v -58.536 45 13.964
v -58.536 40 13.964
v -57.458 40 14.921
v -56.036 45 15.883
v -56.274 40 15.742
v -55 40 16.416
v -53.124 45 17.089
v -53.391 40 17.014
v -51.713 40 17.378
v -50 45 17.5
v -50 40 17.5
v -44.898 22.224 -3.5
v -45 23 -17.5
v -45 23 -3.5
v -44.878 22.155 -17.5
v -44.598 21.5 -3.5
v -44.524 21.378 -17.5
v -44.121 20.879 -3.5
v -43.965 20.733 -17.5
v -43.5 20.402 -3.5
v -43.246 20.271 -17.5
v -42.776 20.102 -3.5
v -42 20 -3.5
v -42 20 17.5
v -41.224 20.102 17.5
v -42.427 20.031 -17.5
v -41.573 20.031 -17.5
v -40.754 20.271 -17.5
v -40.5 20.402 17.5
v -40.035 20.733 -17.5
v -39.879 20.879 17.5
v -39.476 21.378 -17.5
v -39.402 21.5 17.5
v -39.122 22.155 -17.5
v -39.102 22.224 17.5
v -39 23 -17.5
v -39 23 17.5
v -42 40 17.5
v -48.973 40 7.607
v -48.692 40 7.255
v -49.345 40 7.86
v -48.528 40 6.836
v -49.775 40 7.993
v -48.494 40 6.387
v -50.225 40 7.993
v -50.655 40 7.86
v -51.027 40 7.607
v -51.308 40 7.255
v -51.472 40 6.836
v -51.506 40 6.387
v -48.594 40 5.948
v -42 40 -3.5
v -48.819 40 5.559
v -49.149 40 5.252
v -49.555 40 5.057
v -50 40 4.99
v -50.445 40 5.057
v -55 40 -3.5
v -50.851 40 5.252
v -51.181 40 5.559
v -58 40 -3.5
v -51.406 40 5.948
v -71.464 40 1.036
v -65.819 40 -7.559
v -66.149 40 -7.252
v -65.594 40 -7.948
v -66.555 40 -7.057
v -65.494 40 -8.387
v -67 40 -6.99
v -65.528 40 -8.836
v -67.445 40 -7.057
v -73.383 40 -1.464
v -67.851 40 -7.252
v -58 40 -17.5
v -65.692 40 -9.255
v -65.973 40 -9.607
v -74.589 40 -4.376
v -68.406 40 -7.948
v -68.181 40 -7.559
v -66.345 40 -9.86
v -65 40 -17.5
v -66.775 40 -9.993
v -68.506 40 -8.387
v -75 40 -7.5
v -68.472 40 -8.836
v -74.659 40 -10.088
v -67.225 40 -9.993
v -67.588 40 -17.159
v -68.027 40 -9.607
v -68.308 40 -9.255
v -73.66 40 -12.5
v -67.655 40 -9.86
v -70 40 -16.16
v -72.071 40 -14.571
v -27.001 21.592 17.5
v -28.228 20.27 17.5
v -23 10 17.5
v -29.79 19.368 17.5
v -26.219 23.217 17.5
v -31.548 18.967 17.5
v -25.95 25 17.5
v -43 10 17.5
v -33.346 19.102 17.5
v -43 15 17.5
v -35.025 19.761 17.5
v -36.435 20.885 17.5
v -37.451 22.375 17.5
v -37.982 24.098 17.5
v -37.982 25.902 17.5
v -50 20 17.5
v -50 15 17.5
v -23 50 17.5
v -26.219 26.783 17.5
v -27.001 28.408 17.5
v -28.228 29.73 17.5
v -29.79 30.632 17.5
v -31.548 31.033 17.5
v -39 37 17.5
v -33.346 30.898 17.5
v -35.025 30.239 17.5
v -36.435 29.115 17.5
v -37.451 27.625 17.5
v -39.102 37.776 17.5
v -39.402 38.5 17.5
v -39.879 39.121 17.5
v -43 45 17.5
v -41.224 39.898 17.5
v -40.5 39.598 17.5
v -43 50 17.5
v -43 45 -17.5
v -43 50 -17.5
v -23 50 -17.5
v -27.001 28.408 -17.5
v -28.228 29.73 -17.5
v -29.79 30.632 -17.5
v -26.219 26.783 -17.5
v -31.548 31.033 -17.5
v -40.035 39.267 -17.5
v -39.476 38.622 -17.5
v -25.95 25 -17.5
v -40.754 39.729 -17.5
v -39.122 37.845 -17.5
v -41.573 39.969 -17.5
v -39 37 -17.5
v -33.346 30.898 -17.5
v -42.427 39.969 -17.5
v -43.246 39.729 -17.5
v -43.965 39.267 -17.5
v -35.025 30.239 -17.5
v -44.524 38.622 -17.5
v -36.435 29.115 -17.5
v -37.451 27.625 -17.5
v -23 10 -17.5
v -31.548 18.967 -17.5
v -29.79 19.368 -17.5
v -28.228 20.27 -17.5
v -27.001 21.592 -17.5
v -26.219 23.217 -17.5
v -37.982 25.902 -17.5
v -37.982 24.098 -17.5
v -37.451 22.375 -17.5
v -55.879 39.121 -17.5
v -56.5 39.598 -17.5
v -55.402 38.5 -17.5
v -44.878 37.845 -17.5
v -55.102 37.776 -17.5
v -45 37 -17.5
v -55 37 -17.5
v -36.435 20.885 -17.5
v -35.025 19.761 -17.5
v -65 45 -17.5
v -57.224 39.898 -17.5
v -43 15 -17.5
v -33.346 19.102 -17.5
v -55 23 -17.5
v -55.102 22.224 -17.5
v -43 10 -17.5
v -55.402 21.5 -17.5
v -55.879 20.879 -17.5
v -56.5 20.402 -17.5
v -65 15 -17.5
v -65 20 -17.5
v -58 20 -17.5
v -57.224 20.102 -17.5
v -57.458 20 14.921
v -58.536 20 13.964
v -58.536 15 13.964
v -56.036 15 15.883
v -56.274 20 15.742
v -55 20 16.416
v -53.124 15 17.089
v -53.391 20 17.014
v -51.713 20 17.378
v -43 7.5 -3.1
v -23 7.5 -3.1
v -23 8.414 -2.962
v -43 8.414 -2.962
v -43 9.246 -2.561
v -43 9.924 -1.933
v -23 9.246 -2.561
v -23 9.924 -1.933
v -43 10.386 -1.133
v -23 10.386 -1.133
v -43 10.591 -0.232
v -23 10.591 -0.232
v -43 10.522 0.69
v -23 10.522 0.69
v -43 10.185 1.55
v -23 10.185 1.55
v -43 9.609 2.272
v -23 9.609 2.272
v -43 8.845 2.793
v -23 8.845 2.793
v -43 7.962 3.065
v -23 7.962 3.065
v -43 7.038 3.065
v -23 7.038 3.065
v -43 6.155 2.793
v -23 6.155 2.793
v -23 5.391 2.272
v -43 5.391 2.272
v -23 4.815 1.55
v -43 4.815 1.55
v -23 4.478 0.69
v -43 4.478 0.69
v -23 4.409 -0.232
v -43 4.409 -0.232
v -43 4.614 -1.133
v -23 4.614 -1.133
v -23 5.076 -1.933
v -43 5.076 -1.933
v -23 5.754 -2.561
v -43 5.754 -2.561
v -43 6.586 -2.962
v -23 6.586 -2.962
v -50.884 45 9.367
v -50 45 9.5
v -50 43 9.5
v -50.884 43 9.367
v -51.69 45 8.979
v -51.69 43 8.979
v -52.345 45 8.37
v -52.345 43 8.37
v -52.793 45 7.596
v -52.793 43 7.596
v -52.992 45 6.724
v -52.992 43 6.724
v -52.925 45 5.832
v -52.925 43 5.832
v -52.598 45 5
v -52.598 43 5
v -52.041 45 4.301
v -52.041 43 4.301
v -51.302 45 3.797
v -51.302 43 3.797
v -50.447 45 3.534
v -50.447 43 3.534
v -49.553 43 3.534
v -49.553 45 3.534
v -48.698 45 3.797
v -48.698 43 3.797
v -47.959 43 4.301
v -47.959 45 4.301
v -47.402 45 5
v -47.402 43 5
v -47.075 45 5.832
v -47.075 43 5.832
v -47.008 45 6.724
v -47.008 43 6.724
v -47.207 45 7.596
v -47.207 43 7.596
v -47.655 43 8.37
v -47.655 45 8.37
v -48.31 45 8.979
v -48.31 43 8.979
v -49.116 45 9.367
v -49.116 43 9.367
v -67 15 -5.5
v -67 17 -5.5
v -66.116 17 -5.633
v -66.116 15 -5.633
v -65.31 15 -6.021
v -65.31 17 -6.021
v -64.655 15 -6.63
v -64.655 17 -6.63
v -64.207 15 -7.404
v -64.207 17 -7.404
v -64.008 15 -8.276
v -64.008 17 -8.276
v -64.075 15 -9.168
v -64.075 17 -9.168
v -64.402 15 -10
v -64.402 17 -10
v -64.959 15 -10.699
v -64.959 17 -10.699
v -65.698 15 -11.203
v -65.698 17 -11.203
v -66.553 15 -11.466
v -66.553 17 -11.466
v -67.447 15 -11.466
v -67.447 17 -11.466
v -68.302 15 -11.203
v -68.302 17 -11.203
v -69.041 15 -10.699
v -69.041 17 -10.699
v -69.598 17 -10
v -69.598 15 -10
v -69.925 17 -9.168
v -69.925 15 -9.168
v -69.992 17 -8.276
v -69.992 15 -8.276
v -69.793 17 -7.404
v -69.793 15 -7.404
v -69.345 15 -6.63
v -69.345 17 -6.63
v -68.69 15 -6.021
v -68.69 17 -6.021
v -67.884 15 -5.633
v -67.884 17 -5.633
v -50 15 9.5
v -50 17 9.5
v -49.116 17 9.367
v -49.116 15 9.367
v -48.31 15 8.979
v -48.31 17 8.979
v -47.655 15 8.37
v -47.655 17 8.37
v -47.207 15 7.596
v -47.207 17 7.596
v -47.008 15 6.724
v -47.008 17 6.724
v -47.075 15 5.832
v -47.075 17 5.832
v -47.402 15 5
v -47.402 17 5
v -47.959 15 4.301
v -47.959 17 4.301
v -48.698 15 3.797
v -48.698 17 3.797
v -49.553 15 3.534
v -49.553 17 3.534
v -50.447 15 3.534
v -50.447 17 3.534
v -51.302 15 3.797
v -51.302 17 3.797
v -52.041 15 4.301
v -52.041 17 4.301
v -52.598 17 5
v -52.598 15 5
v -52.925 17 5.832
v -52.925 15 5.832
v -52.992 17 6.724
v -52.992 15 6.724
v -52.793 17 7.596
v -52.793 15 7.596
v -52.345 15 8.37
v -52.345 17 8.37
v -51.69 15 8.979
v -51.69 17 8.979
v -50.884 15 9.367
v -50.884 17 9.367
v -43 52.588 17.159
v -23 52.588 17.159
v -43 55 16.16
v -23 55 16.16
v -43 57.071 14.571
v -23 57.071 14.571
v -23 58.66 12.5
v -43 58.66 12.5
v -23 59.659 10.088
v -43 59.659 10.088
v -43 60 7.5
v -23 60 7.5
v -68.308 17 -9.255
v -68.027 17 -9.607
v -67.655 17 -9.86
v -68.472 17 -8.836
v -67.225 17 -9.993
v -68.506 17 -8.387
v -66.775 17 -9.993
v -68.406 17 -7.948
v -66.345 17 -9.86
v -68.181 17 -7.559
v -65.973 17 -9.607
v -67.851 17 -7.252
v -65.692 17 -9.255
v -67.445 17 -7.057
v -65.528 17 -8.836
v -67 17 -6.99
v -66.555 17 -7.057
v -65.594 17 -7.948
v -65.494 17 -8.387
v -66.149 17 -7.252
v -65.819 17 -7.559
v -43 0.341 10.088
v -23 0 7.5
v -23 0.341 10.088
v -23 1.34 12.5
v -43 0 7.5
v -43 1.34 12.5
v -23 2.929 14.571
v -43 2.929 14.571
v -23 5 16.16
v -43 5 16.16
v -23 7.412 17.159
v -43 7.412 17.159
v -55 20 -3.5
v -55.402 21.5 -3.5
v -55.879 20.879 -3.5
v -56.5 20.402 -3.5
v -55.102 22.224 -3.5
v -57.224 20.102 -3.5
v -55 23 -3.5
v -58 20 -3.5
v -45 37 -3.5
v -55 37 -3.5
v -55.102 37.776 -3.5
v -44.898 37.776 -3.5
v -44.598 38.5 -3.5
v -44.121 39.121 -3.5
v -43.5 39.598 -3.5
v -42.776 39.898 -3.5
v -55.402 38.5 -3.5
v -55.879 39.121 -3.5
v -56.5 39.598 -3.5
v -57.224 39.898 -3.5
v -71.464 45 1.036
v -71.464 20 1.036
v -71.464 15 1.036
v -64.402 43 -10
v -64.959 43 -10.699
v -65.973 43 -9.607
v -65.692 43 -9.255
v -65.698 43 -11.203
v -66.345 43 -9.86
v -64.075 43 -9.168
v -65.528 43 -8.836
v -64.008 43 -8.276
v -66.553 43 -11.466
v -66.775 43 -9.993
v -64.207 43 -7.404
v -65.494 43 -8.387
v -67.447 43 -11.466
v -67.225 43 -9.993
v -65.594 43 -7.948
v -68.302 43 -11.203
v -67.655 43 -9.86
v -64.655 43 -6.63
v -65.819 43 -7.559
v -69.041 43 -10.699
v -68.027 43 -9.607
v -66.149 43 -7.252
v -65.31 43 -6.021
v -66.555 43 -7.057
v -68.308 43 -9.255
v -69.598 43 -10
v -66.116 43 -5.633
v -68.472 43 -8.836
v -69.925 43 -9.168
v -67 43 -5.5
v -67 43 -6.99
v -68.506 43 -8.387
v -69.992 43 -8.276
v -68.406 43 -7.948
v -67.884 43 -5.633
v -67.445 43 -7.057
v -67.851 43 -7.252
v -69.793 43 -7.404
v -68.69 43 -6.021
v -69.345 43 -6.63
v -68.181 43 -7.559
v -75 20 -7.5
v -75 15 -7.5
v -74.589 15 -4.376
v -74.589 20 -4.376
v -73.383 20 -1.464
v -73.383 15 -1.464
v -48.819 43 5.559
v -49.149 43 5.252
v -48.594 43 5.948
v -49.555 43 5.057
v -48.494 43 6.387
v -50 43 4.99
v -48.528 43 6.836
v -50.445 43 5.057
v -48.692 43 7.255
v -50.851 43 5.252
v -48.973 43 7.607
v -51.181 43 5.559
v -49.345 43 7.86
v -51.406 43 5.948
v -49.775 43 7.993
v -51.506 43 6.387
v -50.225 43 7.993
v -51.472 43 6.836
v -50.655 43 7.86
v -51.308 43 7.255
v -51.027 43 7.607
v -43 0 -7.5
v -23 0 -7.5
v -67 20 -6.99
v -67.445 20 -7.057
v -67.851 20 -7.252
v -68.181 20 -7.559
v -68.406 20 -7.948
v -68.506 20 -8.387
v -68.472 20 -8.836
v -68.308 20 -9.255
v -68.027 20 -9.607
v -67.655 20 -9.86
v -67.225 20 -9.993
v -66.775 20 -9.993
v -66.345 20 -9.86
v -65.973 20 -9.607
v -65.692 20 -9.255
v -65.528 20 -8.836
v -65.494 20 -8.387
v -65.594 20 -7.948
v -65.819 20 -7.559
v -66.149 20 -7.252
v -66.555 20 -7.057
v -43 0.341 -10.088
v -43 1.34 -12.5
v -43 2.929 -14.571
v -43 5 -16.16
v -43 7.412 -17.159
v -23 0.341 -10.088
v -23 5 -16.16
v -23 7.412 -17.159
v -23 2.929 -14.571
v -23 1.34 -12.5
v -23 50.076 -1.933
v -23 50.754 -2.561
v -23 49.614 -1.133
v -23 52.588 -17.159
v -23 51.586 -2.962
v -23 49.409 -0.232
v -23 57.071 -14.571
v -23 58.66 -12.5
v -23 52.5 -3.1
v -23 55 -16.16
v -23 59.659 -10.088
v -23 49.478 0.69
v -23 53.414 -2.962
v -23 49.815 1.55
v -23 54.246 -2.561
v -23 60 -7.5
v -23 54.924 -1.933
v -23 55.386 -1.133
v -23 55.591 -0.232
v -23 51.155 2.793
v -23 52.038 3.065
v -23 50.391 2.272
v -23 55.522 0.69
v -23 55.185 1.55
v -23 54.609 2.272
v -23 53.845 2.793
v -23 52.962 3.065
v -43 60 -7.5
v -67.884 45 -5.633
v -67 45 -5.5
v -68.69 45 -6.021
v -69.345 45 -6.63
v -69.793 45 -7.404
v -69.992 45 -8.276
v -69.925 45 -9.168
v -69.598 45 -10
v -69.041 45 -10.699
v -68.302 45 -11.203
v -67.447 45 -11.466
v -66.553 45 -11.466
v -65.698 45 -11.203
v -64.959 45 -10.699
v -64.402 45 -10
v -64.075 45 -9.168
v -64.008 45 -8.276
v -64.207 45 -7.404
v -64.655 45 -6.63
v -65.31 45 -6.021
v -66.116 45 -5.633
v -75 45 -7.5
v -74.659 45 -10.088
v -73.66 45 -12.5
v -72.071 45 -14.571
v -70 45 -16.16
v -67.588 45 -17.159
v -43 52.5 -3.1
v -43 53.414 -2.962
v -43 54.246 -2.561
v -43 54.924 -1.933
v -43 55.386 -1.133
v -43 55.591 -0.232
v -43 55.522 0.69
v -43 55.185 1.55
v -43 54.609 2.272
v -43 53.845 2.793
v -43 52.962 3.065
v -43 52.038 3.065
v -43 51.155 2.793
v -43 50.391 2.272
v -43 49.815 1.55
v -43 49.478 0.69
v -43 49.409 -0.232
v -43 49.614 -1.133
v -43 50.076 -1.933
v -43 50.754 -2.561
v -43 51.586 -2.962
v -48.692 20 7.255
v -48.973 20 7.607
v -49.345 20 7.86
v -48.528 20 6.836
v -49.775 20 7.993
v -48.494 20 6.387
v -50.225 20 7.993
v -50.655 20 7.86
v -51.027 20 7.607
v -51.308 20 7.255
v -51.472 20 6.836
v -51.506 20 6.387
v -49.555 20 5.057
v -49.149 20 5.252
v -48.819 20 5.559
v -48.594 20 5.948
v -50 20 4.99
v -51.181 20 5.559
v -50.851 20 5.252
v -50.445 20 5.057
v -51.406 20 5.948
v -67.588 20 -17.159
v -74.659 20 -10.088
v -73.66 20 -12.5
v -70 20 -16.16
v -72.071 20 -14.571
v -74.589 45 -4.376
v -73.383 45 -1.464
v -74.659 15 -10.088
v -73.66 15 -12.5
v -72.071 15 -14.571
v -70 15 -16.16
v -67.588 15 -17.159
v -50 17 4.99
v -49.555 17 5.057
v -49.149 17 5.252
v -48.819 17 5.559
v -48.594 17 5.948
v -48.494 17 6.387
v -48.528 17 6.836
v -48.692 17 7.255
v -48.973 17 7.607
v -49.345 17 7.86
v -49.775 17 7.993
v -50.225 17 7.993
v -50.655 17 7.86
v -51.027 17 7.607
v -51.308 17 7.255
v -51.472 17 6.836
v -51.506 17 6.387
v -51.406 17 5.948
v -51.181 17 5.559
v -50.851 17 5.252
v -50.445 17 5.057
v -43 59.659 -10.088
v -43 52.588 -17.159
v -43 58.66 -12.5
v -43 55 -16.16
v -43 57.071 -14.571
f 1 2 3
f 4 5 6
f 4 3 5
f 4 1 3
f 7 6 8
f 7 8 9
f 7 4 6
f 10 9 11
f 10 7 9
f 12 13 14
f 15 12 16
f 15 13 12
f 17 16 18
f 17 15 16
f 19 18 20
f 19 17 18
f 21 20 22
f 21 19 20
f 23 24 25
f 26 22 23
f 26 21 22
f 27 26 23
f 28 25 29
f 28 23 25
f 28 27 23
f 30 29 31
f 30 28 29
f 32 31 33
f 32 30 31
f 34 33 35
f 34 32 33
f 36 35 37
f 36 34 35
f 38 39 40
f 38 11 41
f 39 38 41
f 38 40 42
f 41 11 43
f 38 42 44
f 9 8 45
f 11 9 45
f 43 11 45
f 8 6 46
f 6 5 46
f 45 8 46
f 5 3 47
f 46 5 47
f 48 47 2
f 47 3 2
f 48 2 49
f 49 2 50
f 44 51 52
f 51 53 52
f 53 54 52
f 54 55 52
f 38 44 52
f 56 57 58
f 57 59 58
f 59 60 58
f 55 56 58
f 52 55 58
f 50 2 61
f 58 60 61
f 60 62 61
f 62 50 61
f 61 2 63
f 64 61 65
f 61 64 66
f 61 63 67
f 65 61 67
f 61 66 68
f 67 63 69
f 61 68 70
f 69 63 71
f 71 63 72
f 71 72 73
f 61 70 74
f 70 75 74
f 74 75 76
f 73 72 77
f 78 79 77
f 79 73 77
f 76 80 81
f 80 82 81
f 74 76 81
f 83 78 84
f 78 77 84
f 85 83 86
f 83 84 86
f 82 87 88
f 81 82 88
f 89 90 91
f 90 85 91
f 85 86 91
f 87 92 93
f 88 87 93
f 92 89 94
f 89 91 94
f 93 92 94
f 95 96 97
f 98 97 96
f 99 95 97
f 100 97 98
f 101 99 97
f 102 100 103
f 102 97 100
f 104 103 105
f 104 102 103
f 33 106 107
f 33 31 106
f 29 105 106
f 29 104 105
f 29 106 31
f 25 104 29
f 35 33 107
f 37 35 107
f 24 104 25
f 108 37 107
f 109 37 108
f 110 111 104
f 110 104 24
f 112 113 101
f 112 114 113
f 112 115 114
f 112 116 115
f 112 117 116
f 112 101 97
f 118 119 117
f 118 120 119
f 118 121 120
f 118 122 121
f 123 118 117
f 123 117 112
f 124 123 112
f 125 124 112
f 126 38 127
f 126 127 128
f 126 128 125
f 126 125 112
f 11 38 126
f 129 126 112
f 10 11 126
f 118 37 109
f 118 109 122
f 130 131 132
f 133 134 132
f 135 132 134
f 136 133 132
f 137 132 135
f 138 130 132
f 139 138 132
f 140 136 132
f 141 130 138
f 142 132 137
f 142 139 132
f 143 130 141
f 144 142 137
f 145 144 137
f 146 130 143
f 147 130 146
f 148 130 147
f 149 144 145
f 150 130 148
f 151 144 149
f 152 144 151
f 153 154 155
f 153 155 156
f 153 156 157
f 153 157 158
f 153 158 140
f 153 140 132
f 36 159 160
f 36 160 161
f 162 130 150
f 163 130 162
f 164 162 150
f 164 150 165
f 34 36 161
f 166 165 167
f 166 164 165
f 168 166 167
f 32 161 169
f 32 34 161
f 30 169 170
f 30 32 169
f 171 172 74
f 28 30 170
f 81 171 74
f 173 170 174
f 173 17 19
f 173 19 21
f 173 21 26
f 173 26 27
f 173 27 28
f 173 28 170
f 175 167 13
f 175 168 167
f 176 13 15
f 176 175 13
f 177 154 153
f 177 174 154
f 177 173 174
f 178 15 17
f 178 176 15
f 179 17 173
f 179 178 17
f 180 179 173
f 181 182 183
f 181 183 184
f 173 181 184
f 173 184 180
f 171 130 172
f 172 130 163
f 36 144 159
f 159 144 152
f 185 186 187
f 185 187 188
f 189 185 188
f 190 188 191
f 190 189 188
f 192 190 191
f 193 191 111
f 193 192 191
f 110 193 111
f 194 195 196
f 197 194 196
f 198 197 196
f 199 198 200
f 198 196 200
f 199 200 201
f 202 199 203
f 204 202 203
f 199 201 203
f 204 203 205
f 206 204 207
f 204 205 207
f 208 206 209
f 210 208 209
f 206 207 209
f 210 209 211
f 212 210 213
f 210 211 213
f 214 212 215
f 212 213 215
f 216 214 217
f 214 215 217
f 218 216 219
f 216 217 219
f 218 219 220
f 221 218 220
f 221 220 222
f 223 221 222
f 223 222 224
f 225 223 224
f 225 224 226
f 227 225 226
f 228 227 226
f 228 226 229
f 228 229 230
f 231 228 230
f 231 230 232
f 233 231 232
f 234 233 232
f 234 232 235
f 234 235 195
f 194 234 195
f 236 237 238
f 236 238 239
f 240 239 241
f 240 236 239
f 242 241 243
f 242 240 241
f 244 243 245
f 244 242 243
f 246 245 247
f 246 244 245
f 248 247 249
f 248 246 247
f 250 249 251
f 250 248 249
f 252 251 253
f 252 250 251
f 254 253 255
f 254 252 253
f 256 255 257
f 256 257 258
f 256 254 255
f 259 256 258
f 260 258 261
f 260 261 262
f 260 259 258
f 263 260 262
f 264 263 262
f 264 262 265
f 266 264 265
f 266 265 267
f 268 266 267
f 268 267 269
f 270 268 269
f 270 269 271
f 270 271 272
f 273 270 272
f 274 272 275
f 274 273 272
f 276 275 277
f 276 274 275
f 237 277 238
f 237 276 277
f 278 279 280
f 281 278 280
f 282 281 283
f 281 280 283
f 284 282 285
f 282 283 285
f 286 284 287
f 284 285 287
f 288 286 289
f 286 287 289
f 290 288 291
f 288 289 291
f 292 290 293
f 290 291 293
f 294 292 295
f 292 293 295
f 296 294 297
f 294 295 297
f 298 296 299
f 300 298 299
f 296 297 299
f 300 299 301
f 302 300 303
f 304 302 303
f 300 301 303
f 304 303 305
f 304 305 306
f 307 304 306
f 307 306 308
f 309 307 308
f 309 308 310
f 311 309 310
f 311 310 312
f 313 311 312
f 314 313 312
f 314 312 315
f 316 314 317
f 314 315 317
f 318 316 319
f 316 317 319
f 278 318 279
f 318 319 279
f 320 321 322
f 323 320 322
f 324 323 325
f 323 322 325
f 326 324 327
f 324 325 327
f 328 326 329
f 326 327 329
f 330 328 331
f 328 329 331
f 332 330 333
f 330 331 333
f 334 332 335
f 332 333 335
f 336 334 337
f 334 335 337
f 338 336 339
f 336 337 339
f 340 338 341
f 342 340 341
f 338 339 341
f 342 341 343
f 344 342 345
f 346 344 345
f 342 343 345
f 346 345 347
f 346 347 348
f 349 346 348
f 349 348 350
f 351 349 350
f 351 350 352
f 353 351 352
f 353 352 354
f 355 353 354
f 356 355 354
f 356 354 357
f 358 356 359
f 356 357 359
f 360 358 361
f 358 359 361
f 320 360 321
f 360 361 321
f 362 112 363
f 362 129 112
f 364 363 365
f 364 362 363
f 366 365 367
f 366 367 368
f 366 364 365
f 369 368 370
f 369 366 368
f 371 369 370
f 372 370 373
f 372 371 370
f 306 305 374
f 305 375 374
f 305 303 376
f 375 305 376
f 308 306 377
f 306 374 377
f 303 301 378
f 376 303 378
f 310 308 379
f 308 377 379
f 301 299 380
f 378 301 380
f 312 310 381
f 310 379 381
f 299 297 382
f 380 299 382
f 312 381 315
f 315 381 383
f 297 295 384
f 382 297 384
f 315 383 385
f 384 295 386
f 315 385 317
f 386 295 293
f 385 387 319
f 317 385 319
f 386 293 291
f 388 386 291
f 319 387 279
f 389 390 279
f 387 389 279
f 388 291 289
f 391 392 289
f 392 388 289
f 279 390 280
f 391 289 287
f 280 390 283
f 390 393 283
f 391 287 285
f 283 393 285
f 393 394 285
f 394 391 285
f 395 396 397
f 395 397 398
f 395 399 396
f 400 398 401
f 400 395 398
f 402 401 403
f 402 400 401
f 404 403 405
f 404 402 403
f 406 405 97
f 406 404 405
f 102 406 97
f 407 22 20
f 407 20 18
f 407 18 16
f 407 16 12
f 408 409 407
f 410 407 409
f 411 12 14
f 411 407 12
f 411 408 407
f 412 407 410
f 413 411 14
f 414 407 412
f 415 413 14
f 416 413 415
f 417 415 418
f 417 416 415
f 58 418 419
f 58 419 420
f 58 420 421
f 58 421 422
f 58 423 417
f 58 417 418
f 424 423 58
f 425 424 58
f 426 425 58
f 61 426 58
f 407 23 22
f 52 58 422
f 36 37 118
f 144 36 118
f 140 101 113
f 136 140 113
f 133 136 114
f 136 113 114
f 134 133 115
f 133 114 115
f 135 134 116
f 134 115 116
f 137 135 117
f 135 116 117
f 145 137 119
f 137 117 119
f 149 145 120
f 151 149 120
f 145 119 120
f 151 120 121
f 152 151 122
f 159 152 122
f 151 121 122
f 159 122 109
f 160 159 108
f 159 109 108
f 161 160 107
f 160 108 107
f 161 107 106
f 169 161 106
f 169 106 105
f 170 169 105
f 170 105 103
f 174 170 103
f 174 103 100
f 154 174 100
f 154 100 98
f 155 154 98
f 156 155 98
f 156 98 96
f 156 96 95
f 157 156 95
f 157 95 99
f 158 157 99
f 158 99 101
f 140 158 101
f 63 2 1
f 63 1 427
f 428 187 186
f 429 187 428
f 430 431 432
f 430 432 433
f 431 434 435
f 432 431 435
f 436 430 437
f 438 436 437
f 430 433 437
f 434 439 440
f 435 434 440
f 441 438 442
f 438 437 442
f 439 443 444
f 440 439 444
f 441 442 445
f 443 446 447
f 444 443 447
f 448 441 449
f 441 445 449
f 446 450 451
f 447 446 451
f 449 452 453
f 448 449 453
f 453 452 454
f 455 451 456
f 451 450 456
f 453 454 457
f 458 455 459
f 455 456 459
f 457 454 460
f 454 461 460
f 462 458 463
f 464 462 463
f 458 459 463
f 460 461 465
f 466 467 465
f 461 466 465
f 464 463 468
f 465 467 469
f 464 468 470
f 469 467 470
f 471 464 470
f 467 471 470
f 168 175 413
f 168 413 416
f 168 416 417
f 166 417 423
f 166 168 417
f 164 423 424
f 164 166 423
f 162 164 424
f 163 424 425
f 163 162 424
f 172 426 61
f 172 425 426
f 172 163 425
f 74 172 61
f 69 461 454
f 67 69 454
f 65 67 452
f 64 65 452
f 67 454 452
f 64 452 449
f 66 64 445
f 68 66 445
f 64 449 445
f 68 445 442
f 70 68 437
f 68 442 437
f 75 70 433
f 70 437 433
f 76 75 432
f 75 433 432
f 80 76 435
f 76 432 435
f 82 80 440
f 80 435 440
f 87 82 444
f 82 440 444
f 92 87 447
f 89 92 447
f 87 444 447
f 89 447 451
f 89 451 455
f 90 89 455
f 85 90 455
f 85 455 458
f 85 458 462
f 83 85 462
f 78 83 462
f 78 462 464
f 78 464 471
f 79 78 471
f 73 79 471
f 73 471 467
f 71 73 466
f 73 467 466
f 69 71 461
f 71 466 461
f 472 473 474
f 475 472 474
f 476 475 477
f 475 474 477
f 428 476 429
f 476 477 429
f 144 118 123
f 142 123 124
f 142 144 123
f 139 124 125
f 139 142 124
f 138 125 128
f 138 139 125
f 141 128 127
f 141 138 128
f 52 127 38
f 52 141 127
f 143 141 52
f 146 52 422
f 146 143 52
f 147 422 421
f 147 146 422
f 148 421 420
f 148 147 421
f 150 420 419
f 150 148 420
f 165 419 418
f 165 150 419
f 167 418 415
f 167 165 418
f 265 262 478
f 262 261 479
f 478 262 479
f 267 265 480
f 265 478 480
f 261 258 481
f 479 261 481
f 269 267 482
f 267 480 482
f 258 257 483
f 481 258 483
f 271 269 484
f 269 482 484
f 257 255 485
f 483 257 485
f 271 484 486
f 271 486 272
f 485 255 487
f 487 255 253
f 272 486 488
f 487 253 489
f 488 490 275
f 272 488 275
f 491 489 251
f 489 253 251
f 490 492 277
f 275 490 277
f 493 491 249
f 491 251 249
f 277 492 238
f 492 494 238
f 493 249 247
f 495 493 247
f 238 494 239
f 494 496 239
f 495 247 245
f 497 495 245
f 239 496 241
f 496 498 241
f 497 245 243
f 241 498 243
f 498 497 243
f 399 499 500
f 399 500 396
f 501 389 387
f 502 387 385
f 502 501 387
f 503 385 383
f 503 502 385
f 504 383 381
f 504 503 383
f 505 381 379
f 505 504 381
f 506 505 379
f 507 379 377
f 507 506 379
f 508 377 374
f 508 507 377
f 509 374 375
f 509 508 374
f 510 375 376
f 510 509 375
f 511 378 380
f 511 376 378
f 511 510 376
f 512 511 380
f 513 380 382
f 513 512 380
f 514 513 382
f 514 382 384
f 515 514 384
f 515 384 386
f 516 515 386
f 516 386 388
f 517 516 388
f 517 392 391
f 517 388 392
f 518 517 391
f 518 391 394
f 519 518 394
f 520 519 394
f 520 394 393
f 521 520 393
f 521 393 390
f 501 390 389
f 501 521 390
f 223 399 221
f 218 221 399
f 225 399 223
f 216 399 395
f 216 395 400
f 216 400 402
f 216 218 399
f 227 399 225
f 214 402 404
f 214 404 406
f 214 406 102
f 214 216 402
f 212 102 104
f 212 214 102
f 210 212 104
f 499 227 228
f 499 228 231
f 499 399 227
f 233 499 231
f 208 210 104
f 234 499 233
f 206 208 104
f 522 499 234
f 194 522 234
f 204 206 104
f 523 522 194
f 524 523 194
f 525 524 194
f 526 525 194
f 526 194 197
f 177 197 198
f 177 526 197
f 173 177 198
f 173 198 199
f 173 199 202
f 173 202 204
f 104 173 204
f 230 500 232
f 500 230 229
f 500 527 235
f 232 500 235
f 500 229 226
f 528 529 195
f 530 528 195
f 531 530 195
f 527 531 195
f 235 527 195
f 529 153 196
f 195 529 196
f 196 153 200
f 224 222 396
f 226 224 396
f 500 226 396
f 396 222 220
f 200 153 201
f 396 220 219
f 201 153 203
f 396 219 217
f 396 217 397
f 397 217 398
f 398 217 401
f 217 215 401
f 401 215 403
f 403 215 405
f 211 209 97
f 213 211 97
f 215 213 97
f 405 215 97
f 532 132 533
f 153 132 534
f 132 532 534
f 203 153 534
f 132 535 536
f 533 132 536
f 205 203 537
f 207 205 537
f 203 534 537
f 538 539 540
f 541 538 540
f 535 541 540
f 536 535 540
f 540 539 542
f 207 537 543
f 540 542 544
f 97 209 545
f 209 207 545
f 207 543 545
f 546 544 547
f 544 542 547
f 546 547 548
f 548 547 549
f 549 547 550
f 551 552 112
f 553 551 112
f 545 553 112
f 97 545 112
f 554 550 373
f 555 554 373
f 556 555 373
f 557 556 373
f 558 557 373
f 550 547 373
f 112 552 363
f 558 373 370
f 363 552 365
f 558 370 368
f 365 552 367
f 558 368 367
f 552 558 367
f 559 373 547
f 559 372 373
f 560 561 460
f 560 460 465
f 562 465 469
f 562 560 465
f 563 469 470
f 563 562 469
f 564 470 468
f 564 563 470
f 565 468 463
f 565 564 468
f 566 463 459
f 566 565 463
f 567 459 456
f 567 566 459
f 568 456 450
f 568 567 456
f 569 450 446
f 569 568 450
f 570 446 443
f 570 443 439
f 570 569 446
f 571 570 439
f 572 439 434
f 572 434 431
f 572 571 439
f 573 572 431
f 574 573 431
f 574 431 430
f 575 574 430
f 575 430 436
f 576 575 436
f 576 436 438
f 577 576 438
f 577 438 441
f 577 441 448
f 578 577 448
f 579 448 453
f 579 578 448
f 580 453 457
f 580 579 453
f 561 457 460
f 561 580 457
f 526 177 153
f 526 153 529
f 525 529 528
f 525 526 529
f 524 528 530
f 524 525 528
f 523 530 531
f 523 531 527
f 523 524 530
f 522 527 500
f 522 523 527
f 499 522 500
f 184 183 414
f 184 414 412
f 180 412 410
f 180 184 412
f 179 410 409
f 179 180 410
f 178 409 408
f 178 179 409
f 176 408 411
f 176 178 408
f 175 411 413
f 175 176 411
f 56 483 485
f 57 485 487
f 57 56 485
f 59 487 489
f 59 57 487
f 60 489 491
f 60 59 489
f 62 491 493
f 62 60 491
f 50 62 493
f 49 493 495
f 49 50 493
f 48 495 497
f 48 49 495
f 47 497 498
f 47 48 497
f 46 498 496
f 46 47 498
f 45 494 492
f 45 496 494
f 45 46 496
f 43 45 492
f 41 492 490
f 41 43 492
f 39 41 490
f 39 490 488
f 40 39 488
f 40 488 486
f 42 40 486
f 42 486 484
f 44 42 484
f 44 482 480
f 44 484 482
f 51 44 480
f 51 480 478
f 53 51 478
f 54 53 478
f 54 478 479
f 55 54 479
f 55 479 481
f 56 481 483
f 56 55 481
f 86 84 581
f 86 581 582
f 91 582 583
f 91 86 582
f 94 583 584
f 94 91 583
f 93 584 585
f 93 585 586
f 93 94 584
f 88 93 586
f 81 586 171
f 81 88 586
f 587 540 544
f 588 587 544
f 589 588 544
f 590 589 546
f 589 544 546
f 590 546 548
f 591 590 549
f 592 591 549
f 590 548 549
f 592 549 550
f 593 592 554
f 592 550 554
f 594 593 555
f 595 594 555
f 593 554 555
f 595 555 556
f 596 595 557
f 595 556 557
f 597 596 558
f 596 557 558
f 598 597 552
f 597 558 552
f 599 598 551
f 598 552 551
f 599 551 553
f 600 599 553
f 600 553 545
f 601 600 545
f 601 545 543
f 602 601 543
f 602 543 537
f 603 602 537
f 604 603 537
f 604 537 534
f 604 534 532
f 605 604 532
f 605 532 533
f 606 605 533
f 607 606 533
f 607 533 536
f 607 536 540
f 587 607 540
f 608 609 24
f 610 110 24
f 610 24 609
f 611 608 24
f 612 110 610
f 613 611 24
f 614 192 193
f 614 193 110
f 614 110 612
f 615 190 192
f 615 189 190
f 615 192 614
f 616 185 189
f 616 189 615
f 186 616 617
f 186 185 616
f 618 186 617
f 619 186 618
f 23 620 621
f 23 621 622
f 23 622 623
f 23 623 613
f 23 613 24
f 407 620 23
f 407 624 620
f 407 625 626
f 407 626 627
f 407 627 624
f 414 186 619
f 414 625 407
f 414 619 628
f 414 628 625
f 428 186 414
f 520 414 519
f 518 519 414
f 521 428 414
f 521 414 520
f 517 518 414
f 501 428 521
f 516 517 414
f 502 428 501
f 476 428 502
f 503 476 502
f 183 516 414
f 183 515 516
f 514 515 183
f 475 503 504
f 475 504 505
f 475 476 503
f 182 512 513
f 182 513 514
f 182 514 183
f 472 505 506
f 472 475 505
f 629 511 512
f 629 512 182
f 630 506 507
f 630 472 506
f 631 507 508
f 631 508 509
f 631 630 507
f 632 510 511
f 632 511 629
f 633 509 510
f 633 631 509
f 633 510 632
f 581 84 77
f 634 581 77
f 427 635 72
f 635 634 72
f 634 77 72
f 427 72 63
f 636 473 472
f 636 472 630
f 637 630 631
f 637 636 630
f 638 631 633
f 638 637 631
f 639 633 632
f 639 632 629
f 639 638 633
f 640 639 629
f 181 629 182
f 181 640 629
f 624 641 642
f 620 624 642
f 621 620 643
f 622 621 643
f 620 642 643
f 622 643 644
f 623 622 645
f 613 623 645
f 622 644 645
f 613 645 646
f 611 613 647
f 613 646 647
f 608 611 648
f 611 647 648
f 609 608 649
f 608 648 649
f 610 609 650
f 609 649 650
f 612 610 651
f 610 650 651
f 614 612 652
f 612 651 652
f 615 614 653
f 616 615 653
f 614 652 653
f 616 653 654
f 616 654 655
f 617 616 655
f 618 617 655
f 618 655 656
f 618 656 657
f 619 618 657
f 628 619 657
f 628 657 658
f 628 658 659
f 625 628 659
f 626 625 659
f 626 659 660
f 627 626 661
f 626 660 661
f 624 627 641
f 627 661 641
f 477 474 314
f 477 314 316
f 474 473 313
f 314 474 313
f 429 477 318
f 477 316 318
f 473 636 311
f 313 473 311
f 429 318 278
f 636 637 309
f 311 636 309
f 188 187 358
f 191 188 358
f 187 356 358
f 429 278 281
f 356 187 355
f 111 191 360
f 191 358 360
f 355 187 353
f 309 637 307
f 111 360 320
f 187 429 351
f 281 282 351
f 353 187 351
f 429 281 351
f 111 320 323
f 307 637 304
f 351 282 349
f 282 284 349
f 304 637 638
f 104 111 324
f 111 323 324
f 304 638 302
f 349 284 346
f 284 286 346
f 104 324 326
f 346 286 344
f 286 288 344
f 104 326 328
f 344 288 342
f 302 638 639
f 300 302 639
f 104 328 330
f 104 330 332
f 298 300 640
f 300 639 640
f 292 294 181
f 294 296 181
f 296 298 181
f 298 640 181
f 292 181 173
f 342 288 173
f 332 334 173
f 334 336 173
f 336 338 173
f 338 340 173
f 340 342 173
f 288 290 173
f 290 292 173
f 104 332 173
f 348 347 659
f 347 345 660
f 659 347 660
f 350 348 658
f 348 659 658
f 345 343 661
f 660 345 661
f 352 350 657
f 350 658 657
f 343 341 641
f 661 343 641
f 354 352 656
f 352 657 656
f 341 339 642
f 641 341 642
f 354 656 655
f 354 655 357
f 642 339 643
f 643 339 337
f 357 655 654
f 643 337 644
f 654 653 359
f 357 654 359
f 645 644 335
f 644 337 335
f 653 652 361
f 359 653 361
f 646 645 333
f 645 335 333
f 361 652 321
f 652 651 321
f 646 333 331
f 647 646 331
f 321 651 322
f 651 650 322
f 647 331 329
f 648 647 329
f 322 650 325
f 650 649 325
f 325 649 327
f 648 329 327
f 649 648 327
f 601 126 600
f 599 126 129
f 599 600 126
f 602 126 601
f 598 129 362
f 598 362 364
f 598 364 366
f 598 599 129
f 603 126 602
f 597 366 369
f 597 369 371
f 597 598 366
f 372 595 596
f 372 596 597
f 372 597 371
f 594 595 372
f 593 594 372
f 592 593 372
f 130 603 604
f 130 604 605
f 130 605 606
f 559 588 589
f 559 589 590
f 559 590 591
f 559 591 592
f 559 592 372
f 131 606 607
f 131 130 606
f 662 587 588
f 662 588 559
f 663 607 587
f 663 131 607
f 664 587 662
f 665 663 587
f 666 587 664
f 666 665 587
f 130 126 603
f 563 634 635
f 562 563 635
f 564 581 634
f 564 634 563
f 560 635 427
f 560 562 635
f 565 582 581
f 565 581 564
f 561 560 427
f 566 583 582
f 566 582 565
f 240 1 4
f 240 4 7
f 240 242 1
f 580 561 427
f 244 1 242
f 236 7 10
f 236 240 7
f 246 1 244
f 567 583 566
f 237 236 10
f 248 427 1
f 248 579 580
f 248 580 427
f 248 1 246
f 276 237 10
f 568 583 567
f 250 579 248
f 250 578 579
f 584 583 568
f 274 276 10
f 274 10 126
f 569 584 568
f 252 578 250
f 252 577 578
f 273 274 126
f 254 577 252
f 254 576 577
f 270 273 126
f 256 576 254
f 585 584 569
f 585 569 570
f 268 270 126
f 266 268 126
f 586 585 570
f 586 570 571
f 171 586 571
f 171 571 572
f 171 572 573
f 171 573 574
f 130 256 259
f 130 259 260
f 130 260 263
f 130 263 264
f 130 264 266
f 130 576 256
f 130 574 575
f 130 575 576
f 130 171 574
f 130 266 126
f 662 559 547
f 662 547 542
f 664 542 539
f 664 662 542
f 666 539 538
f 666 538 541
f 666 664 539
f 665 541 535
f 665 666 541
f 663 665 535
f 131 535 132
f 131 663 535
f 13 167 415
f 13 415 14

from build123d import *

# Parameters (mm, degrees)
EXTRUDE_1_DEPTH      = 60
SKETCH_2_W           = 32
SKETCH_2_H           = 15
CUT_EXTRUDE_1_DEPTH  = 60
SKETCH_3_R           = 3
CUT_EXTRUDE_2_DEPTH  = 30
CUT_EXTRUDE_3_DEPTH  = 30
CUT_EXTRUDE_4_DEPTH  = 50
SKETCH_6_R           = 5
CUT_EXTRUDE_5_DEPTH  = 50
CUT_EXTRUDE_6_DEPTH  = 50
SKETCH_8_W           = 21
SKETCH_8_H           = 14
SKETCH_8_H_2         = 3
CUT_EXTRUDE_7_DEPTH  = 13
SKETCH_9_W           = 21
SKETCH_9_H           = 3
CUT_EXTRUDE_8_DEPTH  = 13
CUT_EXTRUDE_10_DEPTH = 50
CUT_EXTRUDE_11_DEPTH = 50
SKETCH_15_R          = 1.51
CUT_EXTRUDE_14_DEPTH = 100
CUT_EXTRUDE_START    = -100
SKETCH_16_R          = 1.51
CUT_EXTRUDE_15_DEPTH = 100
SKETCH_17_R          = 1.51
CUT_EXTRUDE_16_DEPTH = 100
SKETCH_18_R          = 1.51
CUT_EXTRUDE_17_DEPTH = 100
SKETCH_21_R          = 3
CUT_EXTRUDE_18_DEPTH = 2
CUT_EXTRUDE_START_2  = -2
SKETCH_22_R          = 3
CUT_EXTRUDE_19_DEPTH = 2
SKETCH_23_R          = 5.05
CUT_EXTRUDE_20_DEPTH = 100
SKETCH_24_R          = 3.05
CUT_EXTRUDE_21_DEPTH = 100
SKETCH_25_R          = 3.05
CUT_EXTRUDE_22_DEPTH = 30
SKETCH_27_R          = 6.05
CUT_EXTRUDE_23_DEPTH = 50
SKETCH_28_R          = 3.05
CUT_EXTRUDE_24_DEPTH = 100
SKETCH_29_R          = 3.05
CUT_EXTRUDE_25_DEPTH = 100
SKETCH_30_R          = 6.05
CUT_EXTRUDE_26_DEPTH = 100
SKETCH_31_W          = 60.79957539
SKETCH_31_H          = 66.624791199
CUT_EXTRUDE_27_DEPTH = 100
SKETCH_32_W          = 19.915773323
SKETCH_32_H          = 3
CUT_EXTRUDE_28_DEPTH = 100
SKETCH_33_R          = 3.05
EXTRUDE_2_DEPTH      = 2
SKETCH_34_R          = 3.1
CUT_EXTRUDE_29_DEPTH = 30


with BuildPart() as part:
    # 草图1 → 凸台-拉伸1 (new body)
    with BuildSketch(Plane(origin=(0, 0, 0), x_dir=(1, 0, 0), z_dir=(0, 1, 0))):
        Polygon((-25, -17.5), (5, -17.5), (25, 2.5), (25, 17.5), (-25, 17.5), align=None)
    extrude_1 = extrude(amount=EXTRUDE_1_DEPTH)

    # 草图2 → 切除-拉伸1 (cut)
    with BuildSketch(Plane(origin=(0, 0, -17.5), x_dir=(-1, 0, 0), z_dir=(0, 0, -1))):
        with Locations((-9, 52.5)):
            Rectangle(SKETCH_2_W, SKETCH_2_H)
        with Locations((-9, 7.5)):
            Rectangle(SKETCH_2_W, SKETCH_2_H)
    cut_extrude_1 = extrude(amount=-CUT_EXTRUDE_1_DEPTH, mode=Mode.SUBTRACT)

    # 草图3 → 切除-拉伸2 (cut)
    with BuildSketch(Plane.ZY.offset(25)):
        with Locations((0, 52.5)):
            Circle(SKETCH_3_R)
        with Locations((0, 7.5)):
            Circle(SKETCH_3_R)
    extrude(amount=-CUT_EXTRUDE_2_DEPTH, mode=Mode.SUBTRACT)

    # 草图4 → 切除-拉伸3 (cut)
    with BuildSketch(Plane.ZY.offset(25)):
        with BuildLine():
            Line((-7.5, 60), (-17.5, 60))
            Line((-17.5, 60), (-17.5, 50))
            ThreePointArc((-17.5, 50), (-14.571067812, 57.071067812), (-7.5, 60))
        make_face()
        with BuildLine():
            Line((17.5, 60), (7.5, 60))
            ThreePointArc((7.5, 60), (14.571067812, 57.071067812), (17.5, 50))
            Line((17.5, 50), (17.5, 60))
        make_face()
        with BuildLine():
            Line((17.5, 0), (17.5, 10))
            ThreePointArc((17.5, 10), (14.571067812, 2.928932188), (7.5, 0))
            Line((7.5, 0), (17.5, 0))
        make_face()
        with BuildLine():
            ThreePointArc((-7.5, 0), (-14.571067812, 2.928932188), (-17.5, 10))
            Line((-17.5, 10), (-17.5, 0))
            Line((-17.5, 0), (-7.5, 0))
        make_face()
    extrude(amount=-CUT_EXTRUDE_3_DEPTH, mode=Mode.SUBTRACT)

    # 草图5 → 切除-拉伸4 (cut)
    with BuildSketch(Plane(origin=(0, 0, -17.5), x_dir=(-1, 0, 0), z_dir=(0, 0, -1))):
        with BuildLine():
            Line((5, 37), (5, 23))
            ThreePointArc((5, 23), (8, 20), (11, 23))
            Line((11, 23), (11, 37))
            ThreePointArc((11, 37), (8, 40), (5, 37))
        make_face()
    cut_extrude_4 = extrude(amount=-CUT_EXTRUDE_4_DEPTH, mode=Mode.SUBTRACT)

    # 草图6 → 切除-拉伸5 (cut)
    with BuildSketch(Plane(origin=(0, 0, -17.5), x_dir=(-1, 0, 0), z_dir=(0, 0, -1))):
        with Locations((18, 25)):
            Circle(SKETCH_6_R)
    extrude(amount=-CUT_EXTRUDE_5_DEPTH, mode=Mode.SUBTRACT)

    # 草图7 → 切除-拉伸6 (cut)
    with BuildSketch(Plane(origin=(0, 0, -17.5), x_dir=(-1, 0, 0), z_dir=(0, 0, -1))):
        with BuildLine():
            ThreePointArc((-5, 37), (-5.878679656, 39.121320344), (-8, 40))
            Line((-8, 40), (-25, 40))
            Line((-25, 40), (-25, 20))
            Line((-25, 20), (-8, 20))
            ThreePointArc((-8, 20), (-5.878679656, 20.878679656), (-5, 23))
            Line((-5, 23), (-5, 30))
            Line((-5, 30), (-5, 37))
        make_face()
    cut_extrude_6 = extrude(amount=-CUT_EXTRUDE_6_DEPTH, mode=Mode.SUBTRACT)

    # 草图8 → 切除-拉伸7 (cut)
    with BuildSketch(Plane(origin=(5, 0, 0), x_dir=(0, 0, -1), z_dir=(1, 0, 0))):
        with Locations((-7, 30)):
            Rectangle(SKETCH_8_W, SKETCH_8_H)
        with Locations((-7, 38.5)):
            Rectangle(SKETCH_8_W, SKETCH_8_H_2)
        with Locations((-7, 21.5)):
            Rectangle(SKETCH_8_W, SKETCH_8_H_2)
    cut_extrude_7 = extrude(amount=-CUT_EXTRUDE_7_DEPTH, mode=Mode.SUBTRACT)

    # 草图9 → 切除-拉伸8 (cut)
    with BuildSketch(Plane.ZY.offset(-5)):
        with Locations((7, 38.5)):
            Rectangle(SKETCH_9_W, SKETCH_9_H)
        with Locations((7, 21.5)):
            Rectangle(SKETCH_9_W, SKETCH_9_H)
    extrude(amount=-CUT_EXTRUDE_8_DEPTH, mode=Mode.SUBTRACT)

    # 草图10 → 切除-拉伸10 (cut)
    with BuildSketch(Plane(origin=(0, 15, 0), x_dir=(-1, 0, 0), z_dir=(0, -1, 0))):
        with BuildLine():
            Line((-25, 17.5), (-25, 7.5))
            ThreePointArc((-25, 7.5), (-22.071067812, 14.571067812), (-15, 17.5))
            Line((-15, 17.5), (-25, 17.5))
        make_face()
        with BuildLine():
            Line((-25, 2.5), (-25, 7.5))
            ThreePointArc((-25, 7.5), (-24.081144675, 2.880602337), (-21.464466094, -1.035533906))
            Line((-21.464466094, -1.035533906), (-25, 2.5))
        make_face()
    cut_extrude_10 = extrude(amount=-CUT_EXTRUDE_10_DEPTH, mode=Mode.SUBTRACT)

    # 草图11 → 切除-拉伸11 (cut)
    with BuildSketch(Plane(origin=(0, 45, 0), x_dir=(1, 0, 0), z_dir=(0, 1, 0))):
        with BuildLine():
            Line((5, -17.5), (8.535533906, -13.964466094))
            ThreePointArc((8.535533906, -13.964466094), (4.619397663, -16.581144675), (0, -17.5))
            Line((0, -17.5), (5, -17.5))
        make_face()
    cut_extrude_11 = extrude(amount=-CUT_EXTRUDE_11_DEPTH, mode=Mode.SUBTRACT)

    # 草图15 → 切除-拉伸14 (cut)
    with BuildSketch(Plane(origin=(0, 20, 0), x_dir=(1, 0, 0), z_dir=(0, 1, 0))):
        with Locations(Location((17, 8.5, 0), (0, 0, 270))):
            Circle(SKETCH_15_R)
    cut_extrude_14 = extrude(amount=-CUT_EXTRUDE_14_DEPTH, mode=Mode.SUBTRACT)

    # 草图16 → 切除-拉伸15 (cut)
    with BuildSketch(Plane.XZ.offset(-15).offset(CUT_EXTRUDE_START)):
        with Locations(Location((17, -8.5, 0), (0, 0, 90))):
            Circle(SKETCH_16_R)
    cut_extrude_15 = extrude(amount=CUT_EXTRUDE_15_DEPTH, mode=Mode.SUBTRACT)

    # 草图17 → 切除-拉伸16 (cut)
    with BuildSketch(Plane(origin=(0, 40, 0), x_dir=(-1, 0, 0), z_dir=(0, -1, 0))):
        with Locations(Location((0, -6.5, 0), (0, 0, 90))):
            Circle(SKETCH_17_R)
    cut_extrude_16 = extrude(amount=-CUT_EXTRUDE_16_DEPTH, mode=Mode.SUBTRACT)

    # 草图18 → 切除-拉伸17 (cut)
    with BuildSketch(Plane(origin=(0, 45, 0), x_dir=(1, 0, 0), z_dir=(0, 1, 0)).offset(CUT_EXTRUDE_START)):
        with Locations(Location((0, -6.5, 0), (0, 0, 90))):
            Circle(SKETCH_18_R)
    cut_extrude_17 = extrude(amount=CUT_EXTRUDE_17_DEPTH, mode=Mode.SUBTRACT)

    # 草图21 → 切除-拉伸18 (cut)
    with BuildSketch(Plane(origin=(0, 45, 0), x_dir=(1, 0, 0), z_dir=(0, 1, 0))):
        with Locations(Location((0, -6.5, 0), (0, 0, 270))):
            Circle(SKETCH_21_R)
        with Locations(Location((17, 8.5, 0), (0, 0, 270))):
            Circle(SKETCH_21_R)
    cut_extrude_18 = extrude(amount=-CUT_EXTRUDE_18_DEPTH, mode=Mode.SUBTRACT)

    # 草图22 → 切除-拉伸19 (cut)
    with BuildSketch(Plane(origin=(0, 15, 0), x_dir=(-1, 0, 0), z_dir=(0, -1, 0)).offset(CUT_EXTRUDE_START_2)):
        with Locations(Location((0, -6.5, 0), (0, 0, 270))):
            Circle(SKETCH_22_R)
        with Locations(Location((-17, 8.5, 0), (0, 0, 270))):
            Circle(SKETCH_22_R)
    cut_extrude_19 = extrude(amount=CUT_EXTRUDE_19_DEPTH, mode=Mode.SUBTRACT)

    # 草图23 → 切除-拉伸20 (cut)
    with BuildSketch(Plane(origin=(0, 0, -17.5), x_dir=(-1, 0, 0), z_dir=(0, 0, -1))):
        with Locations((18, 25)):
            Circle(SKETCH_23_R)
    extrude(amount=-CUT_EXTRUDE_20_DEPTH, mode=Mode.SUBTRACT)

    # 草图24 → 切除-拉伸21 (cut)
    with BuildSketch(Plane.ZY.offset(25)):
        with Locations((0, 52.5)):
            Circle(SKETCH_24_R)
    extrude(amount=-CUT_EXTRUDE_21_DEPTH, mode=Mode.SUBTRACT)

    # 草图25 → 切除-拉伸22 (cut)
    with BuildSketch(Plane.ZY.offset(25)):
        with Locations((0, 7.5)):
            Circle(SKETCH_25_R)
    extrude(amount=-CUT_EXTRUDE_22_DEPTH, mode=Mode.SUBTRACT)

    # 草图27 → 切除-拉伸23 (cut)
    with BuildSketch(Plane(origin=(0, 0, -17.5), x_dir=(-1, 0, 0), z_dir=(0, 0, -1))):
        with Locations((18, 25)):
            Circle(SKETCH_27_R)
    extrude(amount=-CUT_EXTRUDE_23_DEPTH, mode=Mode.SUBTRACT)

    # 镜向4: 凸台-拉伸1, 切除-拉伸1, 切除-拉伸4, 切除-拉伸6, 切除-拉伸7, 切除-拉伸10, 切除-拉伸11, 切除-拉伸14, 切除-拉伸15, 切除-拉伸16, 切除-拉伸17, 切除-拉伸18, 切除-拉伸19 across plane
    add(extrude_1.mirror(Plane(origin=(-25, 60, 17.5), x_dir=(0, 0, 1), z_dir=(-1, 0, 0))))
    add(cut_extrude_1.mirror(Plane(origin=(-25, 60, 17.5), x_dir=(0, 0, 1), z_dir=(-1, 0, 0))), mode=Mode.SUBTRACT)
    add(cut_extrude_4.mirror(Plane(origin=(-25, 60, 17.5), x_dir=(0, 0, 1), z_dir=(-1, 0, 0))), mode=Mode.SUBTRACT)
    add(cut_extrude_6.mirror(Plane(origin=(-25, 60, 17.5), x_dir=(0, 0, 1), z_dir=(-1, 0, 0))), mode=Mode.SUBTRACT)
    add(cut_extrude_7.mirror(Plane(origin=(-25, 60, 17.5), x_dir=(0, 0, 1), z_dir=(-1, 0, 0))), mode=Mode.SUBTRACT)
    add(cut_extrude_10.mirror(Plane(origin=(-25, 60, 17.5), x_dir=(0, 0, 1), z_dir=(-1, 0, 0))), mode=Mode.SUBTRACT)
    add(cut_extrude_11.mirror(Plane(origin=(-25, 60, 17.5), x_dir=(0, 0, 1), z_dir=(-1, 0, 0))), mode=Mode.SUBTRACT)
    add(cut_extrude_14.mirror(Plane(origin=(-25, 60, 17.5), x_dir=(0, 0, 1), z_dir=(-1, 0, 0))), mode=Mode.SUBTRACT)
    add(cut_extrude_15.mirror(Plane(origin=(-25, 60, 17.5), x_dir=(0, 0, 1), z_dir=(-1, 0, 0))), mode=Mode.SUBTRACT)
    add(cut_extrude_16.mirror(Plane(origin=(-25, 60, 17.5), x_dir=(0, 0, 1), z_dir=(-1, 0, 0))), mode=Mode.SUBTRACT)
    add(cut_extrude_17.mirror(Plane(origin=(-25, 60, 17.5), x_dir=(0, 0, 1), z_dir=(-1, 0, 0))), mode=Mode.SUBTRACT)
    add(cut_extrude_18.mirror(Plane(origin=(-25, 60, 17.5), x_dir=(0, 0, 1), z_dir=(-1, 0, 0))), mode=Mode.SUBTRACT)
    add(cut_extrude_19.mirror(Plane(origin=(-25, 60, 17.5), x_dir=(0, 0, 1), z_dir=(-1, 0, 0))), mode=Mode.SUBTRACT)

    # 草图28 → 切除-拉伸24 (cut)
    with BuildSketch(Plane(origin=(-7, 0, 0), x_dir=(0, 0, -1), z_dir=(1, 0, 0)).offset(CUT_EXTRUDE_START)):
        with Locations(Location((0, 7.5, 0), (0, 0, 180))):
            Circle(SKETCH_28_R)
        with BuildLine():
            Line((-17.5, 0), (-17.5, 10))
            ThreePointArc((-17.5, 10), (-14.571067812, 2.928932188), (-7.5, 0))
            Line((-7.5, 0), (-17.5, 0))
        make_face()
        with BuildLine():
            Line((7.5, 0), (17.5, 0))
            Line((17.5, 0), (17.5, 10))
            ThreePointArc((17.5, 10), (14.571067812, 2.928932188), (7.5, 0))
        make_face()
    extrude(amount=CUT_EXTRUDE_24_DEPTH, mode=Mode.SUBTRACT)

    # 草图29 → 切除-拉伸25 (cut)
    with BuildSketch(Plane(origin=(-7, 0, 0), x_dir=(0, 0, -1), z_dir=(1, 0, 0)).offset(CUT_EXTRUDE_START)):
        with Locations(Location((0, 52.5, 0), (0, 0, 180))):
            Circle(SKETCH_29_R)
        with BuildLine():
            Line((17.5, 60), (17.5, 50))
            ThreePointArc((17.5, 50), (14.571067812, 57.071067812), (7.5, 60))
            Line((7.5, 60), (17.5, 60))
        make_face()
        with BuildLine():
            Line((-17.5, 50), (-17.5, 60))
            Line((-17.5, 60), (-7.5, 60))
            ThreePointArc((-7.5, 60), (-14.571067812, 57.071067812), (-17.5, 50))
        make_face()
    extrude(amount=CUT_EXTRUDE_25_DEPTH, mode=Mode.SUBTRACT)

    # 草图30 → 切除-拉伸26 (cut)
    with BuildSketch(Plane.XY.offset(17.5)):
        with Locations((-32, 25)):
            Circle(SKETCH_30_R)
    extrude(amount=-CUT_EXTRUDE_26_DEPTH, mode=Mode.SUBTRACT)

    # 草图31 → 切除-拉伸27 (cut)
    with BuildSketch(Plane.XY.offset(17.5)):
        with Locations((5.399787695, 26.687604401)):
            Rectangle(SKETCH_31_W, SKETCH_31_H)
    extrude(amount=-CUT_EXTRUDE_27_DEPTH, mode=Mode.SUBTRACT)

    # 草图32 → 切除-拉伸28 (cut)
    with BuildSketch(Plane(origin=(-55, 0, 0), x_dir=(0, 0, -1), z_dir=(1, 0, 0))):
        with Locations((-6.457886661, 38.5)):
            Rectangle(SKETCH_32_W, SKETCH_32_H)
        with Locations((-6.457886661, 21.5)):
            Rectangle(SKETCH_32_W, SKETCH_32_H)
    extrude(amount=-CUT_EXTRUDE_28_DEPTH, mode=Mode.SUBTRACT)

    # 草图33 → 凸台-拉伸2 (add)
    with BuildSketch(Plane(origin=(-25, 0, 0), x_dir=(0, 0, -1), z_dir=(1, 0, 0))):
        with BuildLine():
            Line((-7.5, 60), (7.5, 60))
            ThreePointArc((7.5, 60), (14.571067812, 57.071067812), (17.5, 50))
            Line((17.5, 50), (17.5, 10))
            ThreePointArc((17.5, 10), (14.571067812, 2.928932188), (7.5, 0))
            Line((7.5, 0), (-7.5, 0))
            ThreePointArc((-7.5, 0), (-14.571067812, 2.928932188), (-17.5, 10))
            Line((-17.5, 10), (-17.5, 50))
            ThreePointArc((-17.5, 50), (-14.571067812, 57.071067812), (-7.5, 60))
        make_face()
        with Locations(Location((0, 7.5, 0), (0, 0, 180))):
            Circle(SKETCH_33_R, mode=Mode.SUBTRACT)
        with Locations(Location((0, 52.5, 0), (0, 0, 180))):
            Circle(SKETCH_33_R, mode=Mode.SUBTRACT)
    extrude(amount=EXTRUDE_2_DEPTH)

    # 草图34 → 切除-拉伸29 (cut)
    with BuildSketch(Plane(origin=(-23, 0, 0), x_dir=(0, 0, -1), z_dir=(1, 0, 0))):
        with Locations((0, 52.5)):
            Circle(SKETCH_34_R)
        with Locations((0, 7.5)):
            Circle(SKETCH_34_R)
    extrude(amount=-CUT_EXTRUDE_29_DEPTH, mode=Mode.SUBTRACT)


solid = part.part
